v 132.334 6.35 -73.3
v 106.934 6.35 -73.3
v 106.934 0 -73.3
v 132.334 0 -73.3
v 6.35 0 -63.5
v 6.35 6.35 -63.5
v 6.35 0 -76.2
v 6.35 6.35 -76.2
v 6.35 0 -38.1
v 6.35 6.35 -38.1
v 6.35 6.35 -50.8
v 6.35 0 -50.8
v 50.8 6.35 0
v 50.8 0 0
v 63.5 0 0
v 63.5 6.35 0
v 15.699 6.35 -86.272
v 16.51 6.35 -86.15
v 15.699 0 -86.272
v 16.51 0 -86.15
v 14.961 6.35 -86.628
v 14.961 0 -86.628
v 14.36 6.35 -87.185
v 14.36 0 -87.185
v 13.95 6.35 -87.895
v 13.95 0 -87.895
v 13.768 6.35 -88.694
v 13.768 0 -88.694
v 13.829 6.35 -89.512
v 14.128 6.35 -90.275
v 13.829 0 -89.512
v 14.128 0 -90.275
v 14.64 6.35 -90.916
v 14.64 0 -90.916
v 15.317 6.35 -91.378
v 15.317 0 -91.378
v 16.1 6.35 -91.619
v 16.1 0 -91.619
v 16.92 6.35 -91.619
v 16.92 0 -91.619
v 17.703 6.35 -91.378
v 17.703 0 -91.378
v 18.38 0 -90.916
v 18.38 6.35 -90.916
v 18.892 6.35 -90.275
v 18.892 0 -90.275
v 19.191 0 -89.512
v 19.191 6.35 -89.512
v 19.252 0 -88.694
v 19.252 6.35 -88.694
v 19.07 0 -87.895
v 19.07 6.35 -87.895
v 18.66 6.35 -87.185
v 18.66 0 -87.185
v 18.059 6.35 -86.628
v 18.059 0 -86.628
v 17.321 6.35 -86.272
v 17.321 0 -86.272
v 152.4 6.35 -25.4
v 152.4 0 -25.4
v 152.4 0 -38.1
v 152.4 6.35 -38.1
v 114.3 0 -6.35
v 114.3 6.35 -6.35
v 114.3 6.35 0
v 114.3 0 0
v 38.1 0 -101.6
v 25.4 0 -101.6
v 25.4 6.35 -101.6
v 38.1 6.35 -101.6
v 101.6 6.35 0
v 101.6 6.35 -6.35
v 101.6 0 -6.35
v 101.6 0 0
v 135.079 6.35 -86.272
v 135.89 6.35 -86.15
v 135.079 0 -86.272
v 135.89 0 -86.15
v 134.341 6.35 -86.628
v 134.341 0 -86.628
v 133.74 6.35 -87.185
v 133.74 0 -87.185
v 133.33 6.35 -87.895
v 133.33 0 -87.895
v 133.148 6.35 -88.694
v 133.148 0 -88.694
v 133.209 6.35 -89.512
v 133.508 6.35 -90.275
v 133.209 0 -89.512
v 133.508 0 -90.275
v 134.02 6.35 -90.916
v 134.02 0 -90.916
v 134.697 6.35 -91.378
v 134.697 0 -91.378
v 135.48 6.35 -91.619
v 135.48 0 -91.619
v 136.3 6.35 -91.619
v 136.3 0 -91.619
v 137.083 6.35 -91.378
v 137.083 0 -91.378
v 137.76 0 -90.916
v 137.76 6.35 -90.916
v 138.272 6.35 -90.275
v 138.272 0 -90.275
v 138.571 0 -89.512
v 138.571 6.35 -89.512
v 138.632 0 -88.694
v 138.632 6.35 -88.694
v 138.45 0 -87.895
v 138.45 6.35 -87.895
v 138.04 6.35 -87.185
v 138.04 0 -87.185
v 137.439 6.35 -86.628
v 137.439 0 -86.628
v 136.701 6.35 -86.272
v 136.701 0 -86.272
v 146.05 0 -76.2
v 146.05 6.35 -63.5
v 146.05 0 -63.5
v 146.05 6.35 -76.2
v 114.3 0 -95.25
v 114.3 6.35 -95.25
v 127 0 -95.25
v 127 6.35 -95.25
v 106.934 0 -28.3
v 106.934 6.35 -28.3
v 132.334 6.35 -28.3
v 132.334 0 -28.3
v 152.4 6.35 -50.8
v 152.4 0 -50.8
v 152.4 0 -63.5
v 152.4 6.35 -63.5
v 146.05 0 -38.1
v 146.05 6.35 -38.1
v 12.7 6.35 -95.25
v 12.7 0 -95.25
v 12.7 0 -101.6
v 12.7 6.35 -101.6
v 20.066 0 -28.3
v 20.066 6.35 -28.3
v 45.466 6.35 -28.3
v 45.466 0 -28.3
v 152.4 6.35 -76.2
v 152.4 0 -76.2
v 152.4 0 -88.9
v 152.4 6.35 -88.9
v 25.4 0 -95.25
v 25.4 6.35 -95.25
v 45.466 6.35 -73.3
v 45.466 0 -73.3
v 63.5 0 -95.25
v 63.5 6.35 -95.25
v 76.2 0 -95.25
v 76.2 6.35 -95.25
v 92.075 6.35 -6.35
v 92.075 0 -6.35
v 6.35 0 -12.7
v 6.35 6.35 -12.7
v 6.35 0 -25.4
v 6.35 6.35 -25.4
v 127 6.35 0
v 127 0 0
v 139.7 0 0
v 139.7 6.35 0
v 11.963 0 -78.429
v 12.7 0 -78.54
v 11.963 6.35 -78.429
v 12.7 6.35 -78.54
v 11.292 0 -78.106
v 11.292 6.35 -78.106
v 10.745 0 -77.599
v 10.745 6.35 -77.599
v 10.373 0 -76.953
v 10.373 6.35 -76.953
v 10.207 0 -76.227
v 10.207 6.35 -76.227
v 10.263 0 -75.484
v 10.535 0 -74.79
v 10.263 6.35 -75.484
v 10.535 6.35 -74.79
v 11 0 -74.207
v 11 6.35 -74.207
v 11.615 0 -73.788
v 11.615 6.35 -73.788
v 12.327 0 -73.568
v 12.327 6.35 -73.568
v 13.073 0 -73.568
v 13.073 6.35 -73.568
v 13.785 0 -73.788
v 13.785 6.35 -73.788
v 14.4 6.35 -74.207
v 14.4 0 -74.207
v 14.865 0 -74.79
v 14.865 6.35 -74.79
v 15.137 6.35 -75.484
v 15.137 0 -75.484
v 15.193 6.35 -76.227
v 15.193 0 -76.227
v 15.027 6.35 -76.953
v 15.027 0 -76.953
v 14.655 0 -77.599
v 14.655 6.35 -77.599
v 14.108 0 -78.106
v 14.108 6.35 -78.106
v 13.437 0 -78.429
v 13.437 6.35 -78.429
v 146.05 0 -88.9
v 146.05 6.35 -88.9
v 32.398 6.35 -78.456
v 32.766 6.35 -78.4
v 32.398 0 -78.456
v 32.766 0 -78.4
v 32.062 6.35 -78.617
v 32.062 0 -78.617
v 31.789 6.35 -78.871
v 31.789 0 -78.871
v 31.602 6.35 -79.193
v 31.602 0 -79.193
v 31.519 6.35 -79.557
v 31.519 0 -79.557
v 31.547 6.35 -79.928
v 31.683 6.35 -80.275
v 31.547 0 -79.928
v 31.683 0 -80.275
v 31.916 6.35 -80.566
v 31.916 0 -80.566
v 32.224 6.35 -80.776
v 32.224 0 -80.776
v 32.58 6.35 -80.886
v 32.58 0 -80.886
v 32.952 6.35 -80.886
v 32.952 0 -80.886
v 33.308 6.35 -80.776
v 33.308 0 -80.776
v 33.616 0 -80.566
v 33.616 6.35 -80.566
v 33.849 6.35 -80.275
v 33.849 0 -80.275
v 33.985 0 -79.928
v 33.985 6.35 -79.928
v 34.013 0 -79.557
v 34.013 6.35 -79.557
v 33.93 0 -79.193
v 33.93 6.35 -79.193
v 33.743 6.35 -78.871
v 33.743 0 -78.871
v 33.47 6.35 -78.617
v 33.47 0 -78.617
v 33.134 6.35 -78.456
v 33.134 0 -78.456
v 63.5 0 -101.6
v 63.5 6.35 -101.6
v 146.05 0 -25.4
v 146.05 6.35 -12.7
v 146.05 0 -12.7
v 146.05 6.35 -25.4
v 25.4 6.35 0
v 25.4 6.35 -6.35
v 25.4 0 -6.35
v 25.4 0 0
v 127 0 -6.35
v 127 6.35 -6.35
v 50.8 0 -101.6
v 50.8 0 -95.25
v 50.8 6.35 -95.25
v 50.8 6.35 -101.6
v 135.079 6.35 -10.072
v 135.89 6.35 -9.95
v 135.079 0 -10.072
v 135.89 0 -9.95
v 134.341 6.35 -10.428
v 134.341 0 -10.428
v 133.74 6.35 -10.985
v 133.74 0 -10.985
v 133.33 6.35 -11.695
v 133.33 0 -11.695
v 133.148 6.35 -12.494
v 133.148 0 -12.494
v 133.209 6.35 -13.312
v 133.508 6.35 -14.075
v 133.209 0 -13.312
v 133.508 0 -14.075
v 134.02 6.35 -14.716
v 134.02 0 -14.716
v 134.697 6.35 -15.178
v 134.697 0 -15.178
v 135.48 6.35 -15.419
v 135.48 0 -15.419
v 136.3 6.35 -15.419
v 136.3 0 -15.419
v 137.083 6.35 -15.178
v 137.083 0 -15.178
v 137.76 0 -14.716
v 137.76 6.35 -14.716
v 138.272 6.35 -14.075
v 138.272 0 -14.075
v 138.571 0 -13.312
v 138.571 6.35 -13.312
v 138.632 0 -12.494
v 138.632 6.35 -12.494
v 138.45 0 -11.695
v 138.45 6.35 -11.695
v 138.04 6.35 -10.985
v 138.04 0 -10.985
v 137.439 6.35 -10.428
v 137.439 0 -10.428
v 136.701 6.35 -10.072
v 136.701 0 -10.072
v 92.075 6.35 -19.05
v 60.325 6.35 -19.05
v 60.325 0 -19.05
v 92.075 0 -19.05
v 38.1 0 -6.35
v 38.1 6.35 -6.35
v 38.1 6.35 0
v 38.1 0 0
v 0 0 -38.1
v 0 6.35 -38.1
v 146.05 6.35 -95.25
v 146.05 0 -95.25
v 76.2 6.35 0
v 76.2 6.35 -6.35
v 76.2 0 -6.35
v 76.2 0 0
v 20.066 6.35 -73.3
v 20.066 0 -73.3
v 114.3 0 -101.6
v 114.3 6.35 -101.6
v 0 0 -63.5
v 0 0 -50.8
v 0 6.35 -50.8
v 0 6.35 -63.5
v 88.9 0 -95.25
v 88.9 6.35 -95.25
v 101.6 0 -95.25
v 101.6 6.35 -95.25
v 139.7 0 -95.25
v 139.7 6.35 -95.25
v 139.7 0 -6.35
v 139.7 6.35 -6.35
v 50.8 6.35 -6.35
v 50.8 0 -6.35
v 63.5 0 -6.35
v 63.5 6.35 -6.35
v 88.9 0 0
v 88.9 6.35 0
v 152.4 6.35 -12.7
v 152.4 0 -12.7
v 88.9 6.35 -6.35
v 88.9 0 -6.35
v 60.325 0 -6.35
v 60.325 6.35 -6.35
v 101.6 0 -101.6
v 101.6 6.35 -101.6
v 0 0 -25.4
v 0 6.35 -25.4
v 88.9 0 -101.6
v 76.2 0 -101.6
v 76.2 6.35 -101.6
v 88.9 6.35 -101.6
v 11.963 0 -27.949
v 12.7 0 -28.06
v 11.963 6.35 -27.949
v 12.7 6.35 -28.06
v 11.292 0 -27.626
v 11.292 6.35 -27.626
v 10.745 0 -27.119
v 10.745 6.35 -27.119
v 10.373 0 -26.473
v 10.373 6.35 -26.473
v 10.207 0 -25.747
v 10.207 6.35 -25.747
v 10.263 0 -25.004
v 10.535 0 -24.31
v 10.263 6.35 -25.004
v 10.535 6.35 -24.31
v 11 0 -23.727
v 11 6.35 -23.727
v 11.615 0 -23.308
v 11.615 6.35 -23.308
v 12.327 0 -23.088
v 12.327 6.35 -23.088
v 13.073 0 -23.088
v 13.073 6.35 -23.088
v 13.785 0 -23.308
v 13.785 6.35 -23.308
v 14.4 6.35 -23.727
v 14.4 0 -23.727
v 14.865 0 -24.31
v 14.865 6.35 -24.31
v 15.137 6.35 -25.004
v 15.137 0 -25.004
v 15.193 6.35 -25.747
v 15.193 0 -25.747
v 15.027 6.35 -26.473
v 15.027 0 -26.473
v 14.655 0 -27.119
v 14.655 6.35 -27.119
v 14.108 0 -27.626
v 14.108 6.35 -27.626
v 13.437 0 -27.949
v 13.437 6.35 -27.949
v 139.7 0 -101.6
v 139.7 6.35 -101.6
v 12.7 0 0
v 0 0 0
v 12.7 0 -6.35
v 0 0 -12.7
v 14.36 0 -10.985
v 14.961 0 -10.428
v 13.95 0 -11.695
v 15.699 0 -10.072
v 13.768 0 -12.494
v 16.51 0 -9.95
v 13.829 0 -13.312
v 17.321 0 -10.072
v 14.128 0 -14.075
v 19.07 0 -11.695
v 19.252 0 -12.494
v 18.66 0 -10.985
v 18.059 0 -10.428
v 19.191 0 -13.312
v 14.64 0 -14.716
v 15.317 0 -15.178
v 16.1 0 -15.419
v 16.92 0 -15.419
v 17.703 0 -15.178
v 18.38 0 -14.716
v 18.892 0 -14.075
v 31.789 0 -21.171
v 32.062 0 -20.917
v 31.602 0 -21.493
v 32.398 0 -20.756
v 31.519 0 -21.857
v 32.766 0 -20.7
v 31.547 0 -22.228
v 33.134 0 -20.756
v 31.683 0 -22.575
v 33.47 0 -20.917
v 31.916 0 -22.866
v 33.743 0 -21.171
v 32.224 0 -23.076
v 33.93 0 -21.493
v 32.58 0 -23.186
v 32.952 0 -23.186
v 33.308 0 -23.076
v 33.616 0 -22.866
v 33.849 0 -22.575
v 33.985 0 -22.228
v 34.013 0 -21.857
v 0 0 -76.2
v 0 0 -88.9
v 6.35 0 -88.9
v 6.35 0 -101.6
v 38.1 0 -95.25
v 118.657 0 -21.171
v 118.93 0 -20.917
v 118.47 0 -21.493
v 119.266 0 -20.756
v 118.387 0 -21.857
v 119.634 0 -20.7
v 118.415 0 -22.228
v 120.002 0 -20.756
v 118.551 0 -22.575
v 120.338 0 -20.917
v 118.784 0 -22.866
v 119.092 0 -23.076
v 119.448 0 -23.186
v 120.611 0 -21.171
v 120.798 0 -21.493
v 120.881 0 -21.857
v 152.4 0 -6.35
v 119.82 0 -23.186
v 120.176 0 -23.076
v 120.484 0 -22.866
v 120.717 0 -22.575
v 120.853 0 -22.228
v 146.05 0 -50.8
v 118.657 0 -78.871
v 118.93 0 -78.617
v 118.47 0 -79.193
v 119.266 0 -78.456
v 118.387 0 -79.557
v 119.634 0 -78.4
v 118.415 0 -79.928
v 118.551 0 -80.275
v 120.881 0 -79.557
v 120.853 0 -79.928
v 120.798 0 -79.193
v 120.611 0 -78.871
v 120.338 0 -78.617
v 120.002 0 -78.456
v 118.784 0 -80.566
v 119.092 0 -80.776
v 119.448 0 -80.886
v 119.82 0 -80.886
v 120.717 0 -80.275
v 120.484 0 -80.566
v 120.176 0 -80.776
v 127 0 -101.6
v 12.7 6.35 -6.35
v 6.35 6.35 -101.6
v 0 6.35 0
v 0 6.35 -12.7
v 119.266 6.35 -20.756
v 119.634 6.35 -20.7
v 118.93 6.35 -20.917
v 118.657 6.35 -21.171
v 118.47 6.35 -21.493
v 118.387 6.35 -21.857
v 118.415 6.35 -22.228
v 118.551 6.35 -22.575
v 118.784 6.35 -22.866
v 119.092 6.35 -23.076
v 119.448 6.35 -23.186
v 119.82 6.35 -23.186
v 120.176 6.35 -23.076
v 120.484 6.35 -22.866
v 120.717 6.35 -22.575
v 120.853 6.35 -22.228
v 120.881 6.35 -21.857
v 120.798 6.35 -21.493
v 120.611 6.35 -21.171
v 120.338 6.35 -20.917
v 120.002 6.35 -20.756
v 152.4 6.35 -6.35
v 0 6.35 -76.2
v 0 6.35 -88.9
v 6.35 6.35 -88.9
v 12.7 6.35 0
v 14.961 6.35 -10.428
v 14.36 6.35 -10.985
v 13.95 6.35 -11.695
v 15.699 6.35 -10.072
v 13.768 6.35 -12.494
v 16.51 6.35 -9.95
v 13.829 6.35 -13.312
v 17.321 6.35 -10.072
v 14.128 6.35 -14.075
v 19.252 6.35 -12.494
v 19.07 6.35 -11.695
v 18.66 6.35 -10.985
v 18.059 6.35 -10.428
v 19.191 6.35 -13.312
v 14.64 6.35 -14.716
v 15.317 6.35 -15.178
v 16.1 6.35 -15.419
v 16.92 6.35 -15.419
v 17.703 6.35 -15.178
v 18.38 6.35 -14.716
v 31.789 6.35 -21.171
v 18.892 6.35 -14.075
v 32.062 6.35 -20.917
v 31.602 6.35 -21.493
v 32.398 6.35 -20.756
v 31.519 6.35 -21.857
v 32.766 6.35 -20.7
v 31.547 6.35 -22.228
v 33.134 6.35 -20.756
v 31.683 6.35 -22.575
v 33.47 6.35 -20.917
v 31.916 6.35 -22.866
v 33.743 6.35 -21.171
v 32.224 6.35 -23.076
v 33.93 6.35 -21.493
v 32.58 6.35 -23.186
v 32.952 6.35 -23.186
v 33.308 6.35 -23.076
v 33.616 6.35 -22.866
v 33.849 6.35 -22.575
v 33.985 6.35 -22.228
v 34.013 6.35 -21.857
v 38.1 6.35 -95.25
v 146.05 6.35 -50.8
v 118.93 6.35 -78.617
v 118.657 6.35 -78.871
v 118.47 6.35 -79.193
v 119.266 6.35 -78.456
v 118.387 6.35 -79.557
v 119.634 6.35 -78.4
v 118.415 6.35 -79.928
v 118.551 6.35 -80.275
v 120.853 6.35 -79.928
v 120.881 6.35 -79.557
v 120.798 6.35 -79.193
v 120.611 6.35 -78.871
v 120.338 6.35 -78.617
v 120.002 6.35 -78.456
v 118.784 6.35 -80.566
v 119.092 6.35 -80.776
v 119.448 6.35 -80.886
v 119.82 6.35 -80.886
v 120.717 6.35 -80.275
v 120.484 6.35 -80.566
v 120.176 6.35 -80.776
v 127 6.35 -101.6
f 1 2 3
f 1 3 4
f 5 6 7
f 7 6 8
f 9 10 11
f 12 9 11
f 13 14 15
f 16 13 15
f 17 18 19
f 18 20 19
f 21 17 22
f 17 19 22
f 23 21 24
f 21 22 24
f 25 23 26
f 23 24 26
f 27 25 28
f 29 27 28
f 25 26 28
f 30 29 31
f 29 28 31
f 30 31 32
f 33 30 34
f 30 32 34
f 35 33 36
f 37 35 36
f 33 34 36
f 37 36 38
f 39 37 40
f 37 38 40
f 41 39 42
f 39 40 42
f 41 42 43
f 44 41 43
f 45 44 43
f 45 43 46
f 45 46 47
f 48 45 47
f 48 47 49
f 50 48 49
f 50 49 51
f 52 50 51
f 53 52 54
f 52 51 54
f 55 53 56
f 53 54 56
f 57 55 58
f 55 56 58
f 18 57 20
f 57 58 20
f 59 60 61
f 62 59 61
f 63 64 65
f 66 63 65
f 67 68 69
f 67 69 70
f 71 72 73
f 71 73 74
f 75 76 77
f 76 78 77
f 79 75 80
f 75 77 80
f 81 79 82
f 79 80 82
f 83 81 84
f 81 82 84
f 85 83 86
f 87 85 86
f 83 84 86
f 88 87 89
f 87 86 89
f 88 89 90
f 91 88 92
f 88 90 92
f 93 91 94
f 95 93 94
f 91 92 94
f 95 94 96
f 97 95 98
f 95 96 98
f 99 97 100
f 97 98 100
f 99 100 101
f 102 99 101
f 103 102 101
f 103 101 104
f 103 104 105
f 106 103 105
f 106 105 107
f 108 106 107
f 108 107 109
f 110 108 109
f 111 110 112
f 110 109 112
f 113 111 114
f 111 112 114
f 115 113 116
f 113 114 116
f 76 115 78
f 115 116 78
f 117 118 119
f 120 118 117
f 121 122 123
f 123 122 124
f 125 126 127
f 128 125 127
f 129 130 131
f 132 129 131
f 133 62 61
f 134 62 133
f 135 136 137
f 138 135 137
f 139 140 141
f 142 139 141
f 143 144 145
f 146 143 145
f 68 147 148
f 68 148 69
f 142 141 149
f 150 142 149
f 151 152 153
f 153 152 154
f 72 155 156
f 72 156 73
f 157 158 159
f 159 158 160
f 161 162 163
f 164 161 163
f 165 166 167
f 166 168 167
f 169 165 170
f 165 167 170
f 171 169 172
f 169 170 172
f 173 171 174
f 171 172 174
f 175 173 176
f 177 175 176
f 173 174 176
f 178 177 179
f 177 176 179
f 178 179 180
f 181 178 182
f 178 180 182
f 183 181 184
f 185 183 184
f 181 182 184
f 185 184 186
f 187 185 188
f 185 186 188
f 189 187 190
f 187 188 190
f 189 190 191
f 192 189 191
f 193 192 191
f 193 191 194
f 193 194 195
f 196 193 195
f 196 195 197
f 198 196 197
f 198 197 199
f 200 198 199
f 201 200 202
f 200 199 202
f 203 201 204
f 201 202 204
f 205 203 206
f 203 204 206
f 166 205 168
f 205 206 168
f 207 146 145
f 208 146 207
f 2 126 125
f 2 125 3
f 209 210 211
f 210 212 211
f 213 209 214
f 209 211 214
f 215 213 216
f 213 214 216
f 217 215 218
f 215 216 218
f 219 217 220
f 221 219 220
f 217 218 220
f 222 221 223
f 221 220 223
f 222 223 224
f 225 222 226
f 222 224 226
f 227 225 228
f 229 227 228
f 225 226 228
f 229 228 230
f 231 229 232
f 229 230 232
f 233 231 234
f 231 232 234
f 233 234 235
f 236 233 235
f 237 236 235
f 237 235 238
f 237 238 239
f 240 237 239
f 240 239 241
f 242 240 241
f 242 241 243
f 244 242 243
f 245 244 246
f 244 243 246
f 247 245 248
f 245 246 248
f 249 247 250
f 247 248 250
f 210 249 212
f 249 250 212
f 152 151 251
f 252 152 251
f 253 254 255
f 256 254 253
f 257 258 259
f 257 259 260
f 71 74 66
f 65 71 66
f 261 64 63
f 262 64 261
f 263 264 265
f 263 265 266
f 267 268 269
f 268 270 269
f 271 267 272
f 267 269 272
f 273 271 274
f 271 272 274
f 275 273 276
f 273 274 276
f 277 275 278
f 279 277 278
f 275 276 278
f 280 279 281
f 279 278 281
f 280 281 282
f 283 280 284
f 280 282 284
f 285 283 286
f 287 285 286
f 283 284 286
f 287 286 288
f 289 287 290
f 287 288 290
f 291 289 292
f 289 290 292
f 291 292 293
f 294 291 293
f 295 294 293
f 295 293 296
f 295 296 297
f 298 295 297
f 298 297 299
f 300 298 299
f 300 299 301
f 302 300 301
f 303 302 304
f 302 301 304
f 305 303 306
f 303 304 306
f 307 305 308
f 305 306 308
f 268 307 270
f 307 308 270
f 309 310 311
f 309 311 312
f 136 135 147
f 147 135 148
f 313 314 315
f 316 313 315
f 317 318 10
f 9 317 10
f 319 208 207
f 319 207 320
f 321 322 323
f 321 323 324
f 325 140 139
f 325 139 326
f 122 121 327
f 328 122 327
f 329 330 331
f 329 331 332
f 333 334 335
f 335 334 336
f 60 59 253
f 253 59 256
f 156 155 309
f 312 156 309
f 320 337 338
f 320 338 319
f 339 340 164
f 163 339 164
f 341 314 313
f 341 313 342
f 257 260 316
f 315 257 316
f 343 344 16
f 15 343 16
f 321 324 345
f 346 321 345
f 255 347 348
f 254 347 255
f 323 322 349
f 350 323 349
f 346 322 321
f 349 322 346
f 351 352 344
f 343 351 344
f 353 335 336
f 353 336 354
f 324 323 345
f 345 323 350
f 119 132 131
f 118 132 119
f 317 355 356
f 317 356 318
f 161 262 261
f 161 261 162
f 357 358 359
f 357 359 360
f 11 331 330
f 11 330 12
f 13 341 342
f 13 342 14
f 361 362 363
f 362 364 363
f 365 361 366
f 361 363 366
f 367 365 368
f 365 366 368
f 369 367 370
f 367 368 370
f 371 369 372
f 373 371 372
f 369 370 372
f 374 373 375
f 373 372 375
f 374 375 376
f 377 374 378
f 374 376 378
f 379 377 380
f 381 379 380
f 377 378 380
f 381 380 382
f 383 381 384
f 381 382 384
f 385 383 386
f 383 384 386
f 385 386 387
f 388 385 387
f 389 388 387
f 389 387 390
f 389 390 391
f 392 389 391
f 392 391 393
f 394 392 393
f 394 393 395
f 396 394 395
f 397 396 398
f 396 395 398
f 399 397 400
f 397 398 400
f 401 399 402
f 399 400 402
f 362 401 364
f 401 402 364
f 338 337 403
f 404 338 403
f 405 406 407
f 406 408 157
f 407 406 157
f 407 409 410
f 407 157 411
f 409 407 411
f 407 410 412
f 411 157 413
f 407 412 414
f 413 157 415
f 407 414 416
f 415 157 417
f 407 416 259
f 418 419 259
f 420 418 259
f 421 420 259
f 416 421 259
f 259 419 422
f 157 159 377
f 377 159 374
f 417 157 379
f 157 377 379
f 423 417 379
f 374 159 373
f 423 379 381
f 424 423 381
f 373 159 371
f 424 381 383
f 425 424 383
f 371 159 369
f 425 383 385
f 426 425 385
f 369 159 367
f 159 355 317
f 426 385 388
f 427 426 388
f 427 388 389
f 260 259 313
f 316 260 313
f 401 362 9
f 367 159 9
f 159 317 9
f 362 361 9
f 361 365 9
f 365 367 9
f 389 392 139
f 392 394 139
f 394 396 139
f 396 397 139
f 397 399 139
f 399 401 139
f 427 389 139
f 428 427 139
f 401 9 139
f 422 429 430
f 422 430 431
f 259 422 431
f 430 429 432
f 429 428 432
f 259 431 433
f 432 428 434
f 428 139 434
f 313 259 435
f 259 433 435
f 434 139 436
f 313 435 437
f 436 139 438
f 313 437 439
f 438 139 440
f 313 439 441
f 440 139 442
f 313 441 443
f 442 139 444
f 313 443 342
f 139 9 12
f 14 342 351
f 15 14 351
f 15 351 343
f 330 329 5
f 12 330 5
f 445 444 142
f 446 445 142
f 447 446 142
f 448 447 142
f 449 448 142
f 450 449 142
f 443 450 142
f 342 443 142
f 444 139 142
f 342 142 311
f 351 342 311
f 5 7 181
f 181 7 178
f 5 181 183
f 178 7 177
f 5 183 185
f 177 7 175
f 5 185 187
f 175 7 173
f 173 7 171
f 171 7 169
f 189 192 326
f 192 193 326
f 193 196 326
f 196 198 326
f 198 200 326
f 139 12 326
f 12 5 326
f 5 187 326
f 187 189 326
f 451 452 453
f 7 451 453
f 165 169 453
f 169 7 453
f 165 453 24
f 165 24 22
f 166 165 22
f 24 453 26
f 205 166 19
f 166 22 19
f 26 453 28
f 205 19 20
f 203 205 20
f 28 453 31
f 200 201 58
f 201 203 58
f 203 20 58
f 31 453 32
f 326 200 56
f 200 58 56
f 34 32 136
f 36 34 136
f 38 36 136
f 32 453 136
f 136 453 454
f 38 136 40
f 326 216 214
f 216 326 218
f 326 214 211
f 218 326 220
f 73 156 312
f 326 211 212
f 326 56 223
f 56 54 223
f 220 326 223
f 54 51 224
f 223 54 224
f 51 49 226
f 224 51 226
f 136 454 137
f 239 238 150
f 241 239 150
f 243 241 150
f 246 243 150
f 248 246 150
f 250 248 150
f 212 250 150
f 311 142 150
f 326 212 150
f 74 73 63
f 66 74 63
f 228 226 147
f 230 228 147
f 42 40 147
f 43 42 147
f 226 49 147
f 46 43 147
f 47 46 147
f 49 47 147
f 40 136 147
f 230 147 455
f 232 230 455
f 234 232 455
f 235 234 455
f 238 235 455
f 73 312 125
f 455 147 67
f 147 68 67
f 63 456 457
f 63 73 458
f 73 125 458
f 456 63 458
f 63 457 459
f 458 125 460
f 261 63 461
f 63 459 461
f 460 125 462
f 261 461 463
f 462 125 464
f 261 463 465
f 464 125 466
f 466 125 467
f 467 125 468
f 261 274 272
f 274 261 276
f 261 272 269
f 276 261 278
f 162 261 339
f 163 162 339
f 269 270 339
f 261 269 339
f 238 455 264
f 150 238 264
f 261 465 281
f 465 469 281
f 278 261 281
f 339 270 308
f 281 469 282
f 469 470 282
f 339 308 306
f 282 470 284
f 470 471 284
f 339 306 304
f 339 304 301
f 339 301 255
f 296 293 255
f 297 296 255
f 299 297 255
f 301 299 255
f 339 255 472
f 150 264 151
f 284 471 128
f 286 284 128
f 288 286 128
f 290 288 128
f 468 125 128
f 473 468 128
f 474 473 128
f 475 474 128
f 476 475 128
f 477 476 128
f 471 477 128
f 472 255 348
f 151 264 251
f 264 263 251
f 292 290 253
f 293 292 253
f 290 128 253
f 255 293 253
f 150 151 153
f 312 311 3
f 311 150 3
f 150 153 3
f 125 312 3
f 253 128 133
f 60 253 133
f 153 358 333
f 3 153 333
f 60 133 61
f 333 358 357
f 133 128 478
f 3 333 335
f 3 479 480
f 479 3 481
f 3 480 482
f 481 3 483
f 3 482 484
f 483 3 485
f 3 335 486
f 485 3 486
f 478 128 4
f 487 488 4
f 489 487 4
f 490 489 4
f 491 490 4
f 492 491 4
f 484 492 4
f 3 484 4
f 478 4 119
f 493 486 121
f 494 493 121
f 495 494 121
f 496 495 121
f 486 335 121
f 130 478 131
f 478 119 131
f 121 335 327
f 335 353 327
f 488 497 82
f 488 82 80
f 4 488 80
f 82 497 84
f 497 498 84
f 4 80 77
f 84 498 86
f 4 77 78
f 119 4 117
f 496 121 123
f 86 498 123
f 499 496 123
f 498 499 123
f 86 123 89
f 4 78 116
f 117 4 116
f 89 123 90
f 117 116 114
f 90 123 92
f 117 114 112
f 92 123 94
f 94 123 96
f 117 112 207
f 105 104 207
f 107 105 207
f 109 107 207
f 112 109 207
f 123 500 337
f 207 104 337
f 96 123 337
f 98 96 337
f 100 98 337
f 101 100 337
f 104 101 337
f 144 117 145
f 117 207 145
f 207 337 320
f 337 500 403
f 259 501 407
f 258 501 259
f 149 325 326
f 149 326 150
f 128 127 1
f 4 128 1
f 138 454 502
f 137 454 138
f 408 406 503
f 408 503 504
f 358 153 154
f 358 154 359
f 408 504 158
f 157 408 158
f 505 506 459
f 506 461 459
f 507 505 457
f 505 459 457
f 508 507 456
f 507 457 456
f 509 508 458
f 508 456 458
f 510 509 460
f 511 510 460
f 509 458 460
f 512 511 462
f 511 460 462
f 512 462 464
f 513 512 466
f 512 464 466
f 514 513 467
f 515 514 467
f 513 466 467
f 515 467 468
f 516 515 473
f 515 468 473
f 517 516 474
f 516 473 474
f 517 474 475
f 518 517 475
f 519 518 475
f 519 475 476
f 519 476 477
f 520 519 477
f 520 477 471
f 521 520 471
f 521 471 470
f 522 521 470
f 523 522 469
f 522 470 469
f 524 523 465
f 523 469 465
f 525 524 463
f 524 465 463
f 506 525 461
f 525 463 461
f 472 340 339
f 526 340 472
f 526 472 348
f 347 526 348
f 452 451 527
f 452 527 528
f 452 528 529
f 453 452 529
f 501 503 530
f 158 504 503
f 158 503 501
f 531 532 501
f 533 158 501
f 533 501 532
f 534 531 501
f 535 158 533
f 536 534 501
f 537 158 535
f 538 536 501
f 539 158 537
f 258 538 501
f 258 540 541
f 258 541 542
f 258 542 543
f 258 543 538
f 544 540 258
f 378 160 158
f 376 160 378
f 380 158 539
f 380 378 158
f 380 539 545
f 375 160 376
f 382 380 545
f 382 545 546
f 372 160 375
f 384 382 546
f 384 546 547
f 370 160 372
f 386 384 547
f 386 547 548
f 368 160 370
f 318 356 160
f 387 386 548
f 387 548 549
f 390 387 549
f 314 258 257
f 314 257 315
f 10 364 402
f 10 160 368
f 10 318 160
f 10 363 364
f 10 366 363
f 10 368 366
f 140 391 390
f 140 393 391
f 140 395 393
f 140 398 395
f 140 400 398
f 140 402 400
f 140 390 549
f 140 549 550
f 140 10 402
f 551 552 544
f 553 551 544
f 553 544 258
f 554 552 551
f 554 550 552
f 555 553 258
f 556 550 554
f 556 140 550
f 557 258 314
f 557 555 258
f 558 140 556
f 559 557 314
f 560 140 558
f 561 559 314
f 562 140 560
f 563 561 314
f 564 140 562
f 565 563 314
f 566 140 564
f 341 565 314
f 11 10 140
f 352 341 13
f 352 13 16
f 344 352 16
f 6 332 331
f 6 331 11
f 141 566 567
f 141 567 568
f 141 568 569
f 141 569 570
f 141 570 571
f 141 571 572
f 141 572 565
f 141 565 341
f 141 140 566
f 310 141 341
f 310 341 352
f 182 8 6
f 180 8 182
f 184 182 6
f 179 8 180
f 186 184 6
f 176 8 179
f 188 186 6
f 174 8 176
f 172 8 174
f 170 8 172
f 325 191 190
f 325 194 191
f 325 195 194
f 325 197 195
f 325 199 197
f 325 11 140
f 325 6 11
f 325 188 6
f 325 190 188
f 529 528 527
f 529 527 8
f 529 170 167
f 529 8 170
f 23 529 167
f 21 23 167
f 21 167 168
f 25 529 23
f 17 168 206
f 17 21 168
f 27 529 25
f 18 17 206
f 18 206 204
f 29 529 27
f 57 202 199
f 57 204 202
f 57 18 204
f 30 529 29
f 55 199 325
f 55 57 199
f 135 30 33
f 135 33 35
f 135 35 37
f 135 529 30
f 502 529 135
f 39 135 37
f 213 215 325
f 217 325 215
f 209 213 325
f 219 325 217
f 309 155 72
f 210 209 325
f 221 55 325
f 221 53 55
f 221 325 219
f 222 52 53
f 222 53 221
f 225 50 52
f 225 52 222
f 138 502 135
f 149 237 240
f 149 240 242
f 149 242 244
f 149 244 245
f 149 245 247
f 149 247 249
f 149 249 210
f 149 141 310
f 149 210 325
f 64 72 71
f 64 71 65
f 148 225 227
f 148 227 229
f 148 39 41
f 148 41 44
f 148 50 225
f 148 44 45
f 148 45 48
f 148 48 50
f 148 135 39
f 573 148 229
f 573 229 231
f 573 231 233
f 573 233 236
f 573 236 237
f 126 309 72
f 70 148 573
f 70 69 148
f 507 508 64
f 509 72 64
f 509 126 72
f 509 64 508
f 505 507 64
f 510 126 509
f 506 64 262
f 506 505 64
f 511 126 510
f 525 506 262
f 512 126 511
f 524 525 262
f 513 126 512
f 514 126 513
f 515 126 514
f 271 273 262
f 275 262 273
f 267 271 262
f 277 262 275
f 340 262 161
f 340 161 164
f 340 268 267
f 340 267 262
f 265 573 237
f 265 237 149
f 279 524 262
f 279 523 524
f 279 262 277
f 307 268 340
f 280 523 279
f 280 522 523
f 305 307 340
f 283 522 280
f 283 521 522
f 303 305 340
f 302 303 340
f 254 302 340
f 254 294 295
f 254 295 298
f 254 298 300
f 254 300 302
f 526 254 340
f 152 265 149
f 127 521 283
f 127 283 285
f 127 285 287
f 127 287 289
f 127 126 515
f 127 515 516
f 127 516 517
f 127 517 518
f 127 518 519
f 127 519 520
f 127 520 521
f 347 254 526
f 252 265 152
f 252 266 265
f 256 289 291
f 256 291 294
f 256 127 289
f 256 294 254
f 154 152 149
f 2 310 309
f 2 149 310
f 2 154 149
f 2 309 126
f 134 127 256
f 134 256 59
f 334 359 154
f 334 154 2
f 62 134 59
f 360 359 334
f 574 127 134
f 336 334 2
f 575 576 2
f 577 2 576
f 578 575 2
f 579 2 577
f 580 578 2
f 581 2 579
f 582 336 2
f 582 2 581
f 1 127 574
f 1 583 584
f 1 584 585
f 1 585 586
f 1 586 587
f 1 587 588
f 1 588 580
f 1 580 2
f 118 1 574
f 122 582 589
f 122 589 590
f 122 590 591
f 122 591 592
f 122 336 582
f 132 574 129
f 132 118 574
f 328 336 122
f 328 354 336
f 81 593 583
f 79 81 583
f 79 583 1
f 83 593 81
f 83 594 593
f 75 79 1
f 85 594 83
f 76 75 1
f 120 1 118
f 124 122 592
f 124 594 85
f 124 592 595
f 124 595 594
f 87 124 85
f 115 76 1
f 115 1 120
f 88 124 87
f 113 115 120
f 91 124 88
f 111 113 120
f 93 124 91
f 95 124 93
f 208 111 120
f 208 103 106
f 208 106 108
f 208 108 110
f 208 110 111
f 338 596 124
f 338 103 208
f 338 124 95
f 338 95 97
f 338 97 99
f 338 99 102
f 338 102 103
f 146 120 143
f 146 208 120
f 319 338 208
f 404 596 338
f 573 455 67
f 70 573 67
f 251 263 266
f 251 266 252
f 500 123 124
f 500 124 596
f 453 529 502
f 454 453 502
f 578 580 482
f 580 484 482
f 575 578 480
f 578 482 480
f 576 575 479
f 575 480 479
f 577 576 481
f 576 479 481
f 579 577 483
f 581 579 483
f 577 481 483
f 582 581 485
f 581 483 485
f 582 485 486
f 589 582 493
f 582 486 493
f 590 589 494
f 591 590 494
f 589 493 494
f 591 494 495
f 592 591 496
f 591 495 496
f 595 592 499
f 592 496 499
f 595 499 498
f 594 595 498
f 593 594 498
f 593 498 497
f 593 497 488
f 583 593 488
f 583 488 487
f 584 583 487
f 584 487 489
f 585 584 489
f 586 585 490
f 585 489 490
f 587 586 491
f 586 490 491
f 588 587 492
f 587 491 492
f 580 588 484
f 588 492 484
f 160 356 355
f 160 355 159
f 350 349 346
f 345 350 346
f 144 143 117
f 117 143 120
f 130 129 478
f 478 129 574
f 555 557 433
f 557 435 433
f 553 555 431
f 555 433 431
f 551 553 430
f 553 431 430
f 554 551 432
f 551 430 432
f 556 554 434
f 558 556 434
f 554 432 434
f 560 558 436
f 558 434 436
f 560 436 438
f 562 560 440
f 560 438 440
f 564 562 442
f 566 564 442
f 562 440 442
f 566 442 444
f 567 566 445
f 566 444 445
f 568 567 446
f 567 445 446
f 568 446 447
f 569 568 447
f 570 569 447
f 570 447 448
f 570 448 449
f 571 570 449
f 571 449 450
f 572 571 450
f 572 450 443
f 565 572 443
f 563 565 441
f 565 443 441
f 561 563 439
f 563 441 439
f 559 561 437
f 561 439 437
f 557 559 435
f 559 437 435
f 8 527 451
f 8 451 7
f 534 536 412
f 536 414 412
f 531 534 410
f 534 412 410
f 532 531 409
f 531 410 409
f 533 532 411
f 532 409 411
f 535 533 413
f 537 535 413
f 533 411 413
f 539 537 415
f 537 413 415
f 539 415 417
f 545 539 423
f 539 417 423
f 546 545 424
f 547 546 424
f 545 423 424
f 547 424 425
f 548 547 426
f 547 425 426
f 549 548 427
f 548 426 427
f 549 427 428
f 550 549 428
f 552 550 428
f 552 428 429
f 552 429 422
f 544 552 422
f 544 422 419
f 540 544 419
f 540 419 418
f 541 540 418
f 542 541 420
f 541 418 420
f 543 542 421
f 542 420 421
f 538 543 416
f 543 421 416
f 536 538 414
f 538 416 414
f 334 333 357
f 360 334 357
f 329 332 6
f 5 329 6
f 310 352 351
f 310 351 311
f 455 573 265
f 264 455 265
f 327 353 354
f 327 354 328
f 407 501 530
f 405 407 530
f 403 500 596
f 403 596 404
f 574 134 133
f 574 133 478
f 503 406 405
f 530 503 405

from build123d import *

# Parameters (mm, degrees)
SKETCH1_W                            = 152.4
SKETCH1_H                            = 101.6
BOSS_EXTRUDE2_DEPTH                  = 6.35
SKETCH2_W                            = 6.35
SKETCH2_H                            = 12.7
CUT_EXTRUDE2_DEPTH                   = 6.35
SKETCH2_4_W                          = 12.7
SKETCH2_4_H                          = 6.35
CUT_EXTRUDE3_DEPTH                   = 6.35
SKETCH9_W                            = 25.4
SKETCH9_H                            = 45
CUT_EXTRUDE4_DEPTH                   = 184.272045059
SKETCH12_W                           = 31.75
SKETCH12_H                           = 12.7
CUT_EXTRUDE6_DEPTH                   = 184.272045059
SKETCH17_W                           = 1.25
SKETCH17_H                           = 6.35
TAP_DRILL_FOR_M3X0_5_TAP1_AT_2_COUNT = 2
TAP_DRILL_FOR_M3X0_5_TAP1_AT_2_PITCH = 57.7
TAP_DRILL_FOR_M3X0_5_TAP1_AT_3_COUNT = 2
TAP_DRILL_FOR_M3X0_5_TAP1_AT_3_PITCH = 104.284895474
TAP_DRILL_FOR_M3X0_5_TAP1_AT_4_COUNT = 2
TAP_DRILL_FOR_M3X0_5_TAP1_AT_4_PITCH = 86.868
SKETCH19_W                           = 2.75
SKETCH19_H                           = 6.35
M5_CLEARANCE_HOLE1_AT_2_COUNT        = 2
M5_CLEARANCE_HOLE1_AT_2_PITCH        = 119.38
M5_CLEARANCE_HOLE1_AT_3_COUNT        = 2
M5_CLEARANCE_HOLE1_AT_3_PITCH        = 141.626354892
M5_CLEARANCE_HOLE1_AT_4_COUNT        = 2
M5_CLEARANCE_HOLE1_AT_4_PITCH        = 76.2
SKETCH21_W                           = 2.5
SKETCH21_H                           = 6.35
F_5_0MM_DOWEL_HOLE3_AT_2_COUNT       = 2
F_5_0MM_DOWEL_HOLE3_AT_2_PITCH       = 50.48


with BuildPart() as part:
    # Sketch1 → Boss-Extrude2 (new body)
    with BuildSketch(Plane(origin=(0, 0, 0), x_dir=(1, 0, 0), z_dir=(0, 1, 0))):
        with Locations((76.2, 50.8)):
            Rectangle(SKETCH1_W, SKETCH1_H)
    extrude(amount=BOSS_EXTRUDE2_DEPTH)

    # Sketch2 → Cut-Extrude2 (cut)
    with BuildSketch(Plane(origin=(0, 6.35, 0), x_dir=(1, 0, 0), z_dir=(0, 1, 0))):
        with Locations((3.175, 95.25)):
            Rectangle(SKETCH2_W, SKETCH2_H)
        with Locations((3.175, 69.85)):
            Rectangle(SKETCH2_W, SKETCH2_H)
        with Locations((3.175, 44.45)):
            Rectangle(SKETCH2_W, SKETCH2_H)
        with Locations((3.175, 19.05)):
            Rectangle(SKETCH2_W, SKETCH2_H)
    cut_extrude2 = extrude(amount=-CUT_EXTRUDE2_DEPTH, mode=Mode.SUBTRACT)

    # Mirror1: Cut-Extrude2 across plane
    add(cut_extrude2.mirror(Plane.ZY.offset(-76.2)), mode=Mode.SUBTRACT)

    # Sketch2<4> → Cut-Extrude3 (cut)
    with BuildSketch(Plane(origin=(0, 6.35, 0), x_dir=(1, 0, 0), z_dir=(0, 1, 0))):
        with Locations((19.05, 98.425)):
            Rectangle(SKETCH2_4_W, SKETCH2_4_H)
        with Locations((44.45, 98.425)):
            Rectangle(SKETCH2_4_W, SKETCH2_4_H)
        with Locations((69.85, 98.425)):
            Rectangle(SKETCH2_4_W, SKETCH2_4_H)
        with Locations((95.25, 98.425)):
            Rectangle(SKETCH2_4_W, SKETCH2_4_H)
        with Locations((146.05, 98.425)):
            Rectangle(SKETCH2_4_W, SKETCH2_4_H)
        with Locations((120.65, 98.425)):
            Rectangle(SKETCH2_4_W, SKETCH2_4_H)
    cut_extrude3 = extrude(amount=-CUT_EXTRUDE3_DEPTH, mode=Mode.SUBTRACT)

    # Mirror2: Cut-Extrude3 across plane
    add(cut_extrude3.mirror(Plane(origin=(0, 0, -50.8), x_dir=(1, 0, 0), z_dir=(0, 0, -1))), mode=Mode.SUBTRACT)

    # Sketch9 → Cut-Extrude4 (cut, through all)
    with BuildSketch(Plane(origin=(0, 6.35, 0), x_dir=(1, 0, 0), z_dir=(0, 1, 0))):
        with Locations((32.766, 50.8)):
            Rectangle(SKETCH9_W, SKETCH9_H)
        with Locations((119.634, 50.8)):
            Rectangle(SKETCH9_W, SKETCH9_H)
    extrude(amount=-CUT_EXTRUDE4_DEPTH, mode=Mode.SUBTRACT)

    # Sketch12 → Cut-Extrude6 (cut, through all)
    with BuildSketch(Plane(origin=(0, 6.35, 0), x_dir=(1, 0, 0), z_dir=(0, 1, 0))):
        with Locations((76.2, 12.7)):
            Rectangle(SKETCH12_W, SKETCH12_H)
    extrude(amount=-CUT_EXTRUDE6_DEPTH, mode=Mode.SUBTRACT)


with BuildPart() as cut_extrude6_piece_1:
    # of the separate pieces the step leaves, piece 1, a body of its own (cut_extrude6_pieces)
    add(part.part.solids().sort_by_distance((0, 0, -88.9))[0])

    # Sketch17 → Tap Drill for M3x0.5 Tap1 (revolve, cut)
    with BuildSketch(Plane(origin=(32.766, 6.35, -79.65), x_dir=(0, 0, 1), z_dir=(1, 0, 0))):
        with Locations((0.625, 3.175)):
            Rectangle(SKETCH17_W, SKETCH17_H)
    tap_drill_for_m3x0_5_tap1 = revolve(axis=Axis((32.766, 12.7, -79.65), (0, -1, 0)), mode=Mode.SUBTRACT)

    # Tap Drill for M3x0.5 Tap1 at 2: Tap Drill for M3x0.5 Tap1 ×2
    with Locations(*[(0, 0, i * TAP_DRILL_FOR_M3X0_5_TAP1_AT_2_PITCH) for i in range(1, TAP_DRILL_FOR_M3X0_5_TAP1_AT_2_COUNT)]):
        add(tap_drill_for_m3x0_5_tap1, mode=Mode.SUBTRACT)

    # Tap Drill for M3x0.5 Tap1 at 3: Tap Drill for M3x0.5 Tap1 ×2
    with Locations(*[Vector(0.8329873622182414, 0, 0.5532920154716644) * (i * TAP_DRILL_FOR_M3X0_5_TAP1_AT_3_PITCH) for i in range(1, TAP_DRILL_FOR_M3X0_5_TAP1_AT_3_COUNT)]):
        add(tap_drill_for_m3x0_5_tap1, mode=Mode.SUBTRACT)

    # Tap Drill for M3x0.5 Tap1 at 4: Tap Drill for M3x0.5 Tap1 ×2
    with Locations(*[(i * TAP_DRILL_FOR_M3X0_5_TAP1_AT_4_PITCH, 0, 0) for i in range(1, TAP_DRILL_FOR_M3X0_5_TAP1_AT_4_COUNT)]):
        add(tap_drill_for_m3x0_5_tap1, mode=Mode.SUBTRACT)

    # Sketch19 → M5 Clearance Hole1 (revolve, cut)
    with BuildSketch(Plane(origin=(16.51, 6.35, -88.9), x_dir=(0, 0, 1), z_dir=(1, 0, 0))):
        with Locations((1.375, 3.175)):
            Rectangle(SKETCH19_W, SKETCH19_H)
    m5_clearance_hole1 = revolve(axis=Axis((16.51, 12.7, -88.9), (0, -1, 0)), mode=Mode.SUBTRACT)

    # M5 Clearance Hole1 at 2: M5 Clearance Hole1 ×2
    with Locations(*[(i * M5_CLEARANCE_HOLE1_AT_2_PITCH, 0, 0) for i in range(1, M5_CLEARANCE_HOLE1_AT_2_COUNT)]):
        add(m5_clearance_hole1, mode=Mode.SUBTRACT)

    # M5 Clearance Hole1 at 3: M5 Clearance Hole1 ×2
    with Locations(*[Vector(0.8429222095775885, 0, 0.5380354529218647) * (i * M5_CLEARANCE_HOLE1_AT_3_PITCH) for i in range(1, M5_CLEARANCE_HOLE1_AT_3_COUNT)]):
        add(m5_clearance_hole1, mode=Mode.SUBTRACT)

    # M5 Clearance Hole1 at 4: M5 Clearance Hole1 ×2
    with Locations(*[(0, 0, i * M5_CLEARANCE_HOLE1_AT_4_PITCH) for i in range(1, M5_CLEARANCE_HOLE1_AT_4_COUNT)]):
        add(m5_clearance_hole1, mode=Mode.SUBTRACT)

    # Sketch21 → Ø5.0mm Dowel Hole3 (revolve, cut)
    with BuildSketch(Plane(origin=(12.7, 0, -76.04), x_dir=(0, 0, -1), z_dir=(1, 0, 0))):
        with Locations((1.25, 3.175)):
            Rectangle(SKETCH21_W, SKETCH21_H)
    f_5_0mm_dowel_hole3 = revolve(axis=Axis((12.7, -6.35, -76.04), (0, 1, 0)), mode=Mode.SUBTRACT)

    # Ø5.0mm Dowel Hole3 at 2: Ø5.0mm Dowel Hole3 ×2
    with Locations(*[(0, 0, i * F_5_0MM_DOWEL_HOLE3_AT_2_PITCH) for i in range(1, F_5_0MM_DOWEL_HOLE3_AT_2_COUNT)]):
        add(f_5_0mm_dowel_hole3, mode=Mode.SUBTRACT)


with BuildPart() as cut_extrude6_piece_2:
    # of the separate pieces the step leaves, piece 2, a body of its own (cut_extrude6_pieces)
    add(part.part.solids().sort_by_distance((88.9, 0, -6.35))[0])


solid = Compound([cut_extrude6_piece_1.part, cut_extrude6_piece_2.part])
